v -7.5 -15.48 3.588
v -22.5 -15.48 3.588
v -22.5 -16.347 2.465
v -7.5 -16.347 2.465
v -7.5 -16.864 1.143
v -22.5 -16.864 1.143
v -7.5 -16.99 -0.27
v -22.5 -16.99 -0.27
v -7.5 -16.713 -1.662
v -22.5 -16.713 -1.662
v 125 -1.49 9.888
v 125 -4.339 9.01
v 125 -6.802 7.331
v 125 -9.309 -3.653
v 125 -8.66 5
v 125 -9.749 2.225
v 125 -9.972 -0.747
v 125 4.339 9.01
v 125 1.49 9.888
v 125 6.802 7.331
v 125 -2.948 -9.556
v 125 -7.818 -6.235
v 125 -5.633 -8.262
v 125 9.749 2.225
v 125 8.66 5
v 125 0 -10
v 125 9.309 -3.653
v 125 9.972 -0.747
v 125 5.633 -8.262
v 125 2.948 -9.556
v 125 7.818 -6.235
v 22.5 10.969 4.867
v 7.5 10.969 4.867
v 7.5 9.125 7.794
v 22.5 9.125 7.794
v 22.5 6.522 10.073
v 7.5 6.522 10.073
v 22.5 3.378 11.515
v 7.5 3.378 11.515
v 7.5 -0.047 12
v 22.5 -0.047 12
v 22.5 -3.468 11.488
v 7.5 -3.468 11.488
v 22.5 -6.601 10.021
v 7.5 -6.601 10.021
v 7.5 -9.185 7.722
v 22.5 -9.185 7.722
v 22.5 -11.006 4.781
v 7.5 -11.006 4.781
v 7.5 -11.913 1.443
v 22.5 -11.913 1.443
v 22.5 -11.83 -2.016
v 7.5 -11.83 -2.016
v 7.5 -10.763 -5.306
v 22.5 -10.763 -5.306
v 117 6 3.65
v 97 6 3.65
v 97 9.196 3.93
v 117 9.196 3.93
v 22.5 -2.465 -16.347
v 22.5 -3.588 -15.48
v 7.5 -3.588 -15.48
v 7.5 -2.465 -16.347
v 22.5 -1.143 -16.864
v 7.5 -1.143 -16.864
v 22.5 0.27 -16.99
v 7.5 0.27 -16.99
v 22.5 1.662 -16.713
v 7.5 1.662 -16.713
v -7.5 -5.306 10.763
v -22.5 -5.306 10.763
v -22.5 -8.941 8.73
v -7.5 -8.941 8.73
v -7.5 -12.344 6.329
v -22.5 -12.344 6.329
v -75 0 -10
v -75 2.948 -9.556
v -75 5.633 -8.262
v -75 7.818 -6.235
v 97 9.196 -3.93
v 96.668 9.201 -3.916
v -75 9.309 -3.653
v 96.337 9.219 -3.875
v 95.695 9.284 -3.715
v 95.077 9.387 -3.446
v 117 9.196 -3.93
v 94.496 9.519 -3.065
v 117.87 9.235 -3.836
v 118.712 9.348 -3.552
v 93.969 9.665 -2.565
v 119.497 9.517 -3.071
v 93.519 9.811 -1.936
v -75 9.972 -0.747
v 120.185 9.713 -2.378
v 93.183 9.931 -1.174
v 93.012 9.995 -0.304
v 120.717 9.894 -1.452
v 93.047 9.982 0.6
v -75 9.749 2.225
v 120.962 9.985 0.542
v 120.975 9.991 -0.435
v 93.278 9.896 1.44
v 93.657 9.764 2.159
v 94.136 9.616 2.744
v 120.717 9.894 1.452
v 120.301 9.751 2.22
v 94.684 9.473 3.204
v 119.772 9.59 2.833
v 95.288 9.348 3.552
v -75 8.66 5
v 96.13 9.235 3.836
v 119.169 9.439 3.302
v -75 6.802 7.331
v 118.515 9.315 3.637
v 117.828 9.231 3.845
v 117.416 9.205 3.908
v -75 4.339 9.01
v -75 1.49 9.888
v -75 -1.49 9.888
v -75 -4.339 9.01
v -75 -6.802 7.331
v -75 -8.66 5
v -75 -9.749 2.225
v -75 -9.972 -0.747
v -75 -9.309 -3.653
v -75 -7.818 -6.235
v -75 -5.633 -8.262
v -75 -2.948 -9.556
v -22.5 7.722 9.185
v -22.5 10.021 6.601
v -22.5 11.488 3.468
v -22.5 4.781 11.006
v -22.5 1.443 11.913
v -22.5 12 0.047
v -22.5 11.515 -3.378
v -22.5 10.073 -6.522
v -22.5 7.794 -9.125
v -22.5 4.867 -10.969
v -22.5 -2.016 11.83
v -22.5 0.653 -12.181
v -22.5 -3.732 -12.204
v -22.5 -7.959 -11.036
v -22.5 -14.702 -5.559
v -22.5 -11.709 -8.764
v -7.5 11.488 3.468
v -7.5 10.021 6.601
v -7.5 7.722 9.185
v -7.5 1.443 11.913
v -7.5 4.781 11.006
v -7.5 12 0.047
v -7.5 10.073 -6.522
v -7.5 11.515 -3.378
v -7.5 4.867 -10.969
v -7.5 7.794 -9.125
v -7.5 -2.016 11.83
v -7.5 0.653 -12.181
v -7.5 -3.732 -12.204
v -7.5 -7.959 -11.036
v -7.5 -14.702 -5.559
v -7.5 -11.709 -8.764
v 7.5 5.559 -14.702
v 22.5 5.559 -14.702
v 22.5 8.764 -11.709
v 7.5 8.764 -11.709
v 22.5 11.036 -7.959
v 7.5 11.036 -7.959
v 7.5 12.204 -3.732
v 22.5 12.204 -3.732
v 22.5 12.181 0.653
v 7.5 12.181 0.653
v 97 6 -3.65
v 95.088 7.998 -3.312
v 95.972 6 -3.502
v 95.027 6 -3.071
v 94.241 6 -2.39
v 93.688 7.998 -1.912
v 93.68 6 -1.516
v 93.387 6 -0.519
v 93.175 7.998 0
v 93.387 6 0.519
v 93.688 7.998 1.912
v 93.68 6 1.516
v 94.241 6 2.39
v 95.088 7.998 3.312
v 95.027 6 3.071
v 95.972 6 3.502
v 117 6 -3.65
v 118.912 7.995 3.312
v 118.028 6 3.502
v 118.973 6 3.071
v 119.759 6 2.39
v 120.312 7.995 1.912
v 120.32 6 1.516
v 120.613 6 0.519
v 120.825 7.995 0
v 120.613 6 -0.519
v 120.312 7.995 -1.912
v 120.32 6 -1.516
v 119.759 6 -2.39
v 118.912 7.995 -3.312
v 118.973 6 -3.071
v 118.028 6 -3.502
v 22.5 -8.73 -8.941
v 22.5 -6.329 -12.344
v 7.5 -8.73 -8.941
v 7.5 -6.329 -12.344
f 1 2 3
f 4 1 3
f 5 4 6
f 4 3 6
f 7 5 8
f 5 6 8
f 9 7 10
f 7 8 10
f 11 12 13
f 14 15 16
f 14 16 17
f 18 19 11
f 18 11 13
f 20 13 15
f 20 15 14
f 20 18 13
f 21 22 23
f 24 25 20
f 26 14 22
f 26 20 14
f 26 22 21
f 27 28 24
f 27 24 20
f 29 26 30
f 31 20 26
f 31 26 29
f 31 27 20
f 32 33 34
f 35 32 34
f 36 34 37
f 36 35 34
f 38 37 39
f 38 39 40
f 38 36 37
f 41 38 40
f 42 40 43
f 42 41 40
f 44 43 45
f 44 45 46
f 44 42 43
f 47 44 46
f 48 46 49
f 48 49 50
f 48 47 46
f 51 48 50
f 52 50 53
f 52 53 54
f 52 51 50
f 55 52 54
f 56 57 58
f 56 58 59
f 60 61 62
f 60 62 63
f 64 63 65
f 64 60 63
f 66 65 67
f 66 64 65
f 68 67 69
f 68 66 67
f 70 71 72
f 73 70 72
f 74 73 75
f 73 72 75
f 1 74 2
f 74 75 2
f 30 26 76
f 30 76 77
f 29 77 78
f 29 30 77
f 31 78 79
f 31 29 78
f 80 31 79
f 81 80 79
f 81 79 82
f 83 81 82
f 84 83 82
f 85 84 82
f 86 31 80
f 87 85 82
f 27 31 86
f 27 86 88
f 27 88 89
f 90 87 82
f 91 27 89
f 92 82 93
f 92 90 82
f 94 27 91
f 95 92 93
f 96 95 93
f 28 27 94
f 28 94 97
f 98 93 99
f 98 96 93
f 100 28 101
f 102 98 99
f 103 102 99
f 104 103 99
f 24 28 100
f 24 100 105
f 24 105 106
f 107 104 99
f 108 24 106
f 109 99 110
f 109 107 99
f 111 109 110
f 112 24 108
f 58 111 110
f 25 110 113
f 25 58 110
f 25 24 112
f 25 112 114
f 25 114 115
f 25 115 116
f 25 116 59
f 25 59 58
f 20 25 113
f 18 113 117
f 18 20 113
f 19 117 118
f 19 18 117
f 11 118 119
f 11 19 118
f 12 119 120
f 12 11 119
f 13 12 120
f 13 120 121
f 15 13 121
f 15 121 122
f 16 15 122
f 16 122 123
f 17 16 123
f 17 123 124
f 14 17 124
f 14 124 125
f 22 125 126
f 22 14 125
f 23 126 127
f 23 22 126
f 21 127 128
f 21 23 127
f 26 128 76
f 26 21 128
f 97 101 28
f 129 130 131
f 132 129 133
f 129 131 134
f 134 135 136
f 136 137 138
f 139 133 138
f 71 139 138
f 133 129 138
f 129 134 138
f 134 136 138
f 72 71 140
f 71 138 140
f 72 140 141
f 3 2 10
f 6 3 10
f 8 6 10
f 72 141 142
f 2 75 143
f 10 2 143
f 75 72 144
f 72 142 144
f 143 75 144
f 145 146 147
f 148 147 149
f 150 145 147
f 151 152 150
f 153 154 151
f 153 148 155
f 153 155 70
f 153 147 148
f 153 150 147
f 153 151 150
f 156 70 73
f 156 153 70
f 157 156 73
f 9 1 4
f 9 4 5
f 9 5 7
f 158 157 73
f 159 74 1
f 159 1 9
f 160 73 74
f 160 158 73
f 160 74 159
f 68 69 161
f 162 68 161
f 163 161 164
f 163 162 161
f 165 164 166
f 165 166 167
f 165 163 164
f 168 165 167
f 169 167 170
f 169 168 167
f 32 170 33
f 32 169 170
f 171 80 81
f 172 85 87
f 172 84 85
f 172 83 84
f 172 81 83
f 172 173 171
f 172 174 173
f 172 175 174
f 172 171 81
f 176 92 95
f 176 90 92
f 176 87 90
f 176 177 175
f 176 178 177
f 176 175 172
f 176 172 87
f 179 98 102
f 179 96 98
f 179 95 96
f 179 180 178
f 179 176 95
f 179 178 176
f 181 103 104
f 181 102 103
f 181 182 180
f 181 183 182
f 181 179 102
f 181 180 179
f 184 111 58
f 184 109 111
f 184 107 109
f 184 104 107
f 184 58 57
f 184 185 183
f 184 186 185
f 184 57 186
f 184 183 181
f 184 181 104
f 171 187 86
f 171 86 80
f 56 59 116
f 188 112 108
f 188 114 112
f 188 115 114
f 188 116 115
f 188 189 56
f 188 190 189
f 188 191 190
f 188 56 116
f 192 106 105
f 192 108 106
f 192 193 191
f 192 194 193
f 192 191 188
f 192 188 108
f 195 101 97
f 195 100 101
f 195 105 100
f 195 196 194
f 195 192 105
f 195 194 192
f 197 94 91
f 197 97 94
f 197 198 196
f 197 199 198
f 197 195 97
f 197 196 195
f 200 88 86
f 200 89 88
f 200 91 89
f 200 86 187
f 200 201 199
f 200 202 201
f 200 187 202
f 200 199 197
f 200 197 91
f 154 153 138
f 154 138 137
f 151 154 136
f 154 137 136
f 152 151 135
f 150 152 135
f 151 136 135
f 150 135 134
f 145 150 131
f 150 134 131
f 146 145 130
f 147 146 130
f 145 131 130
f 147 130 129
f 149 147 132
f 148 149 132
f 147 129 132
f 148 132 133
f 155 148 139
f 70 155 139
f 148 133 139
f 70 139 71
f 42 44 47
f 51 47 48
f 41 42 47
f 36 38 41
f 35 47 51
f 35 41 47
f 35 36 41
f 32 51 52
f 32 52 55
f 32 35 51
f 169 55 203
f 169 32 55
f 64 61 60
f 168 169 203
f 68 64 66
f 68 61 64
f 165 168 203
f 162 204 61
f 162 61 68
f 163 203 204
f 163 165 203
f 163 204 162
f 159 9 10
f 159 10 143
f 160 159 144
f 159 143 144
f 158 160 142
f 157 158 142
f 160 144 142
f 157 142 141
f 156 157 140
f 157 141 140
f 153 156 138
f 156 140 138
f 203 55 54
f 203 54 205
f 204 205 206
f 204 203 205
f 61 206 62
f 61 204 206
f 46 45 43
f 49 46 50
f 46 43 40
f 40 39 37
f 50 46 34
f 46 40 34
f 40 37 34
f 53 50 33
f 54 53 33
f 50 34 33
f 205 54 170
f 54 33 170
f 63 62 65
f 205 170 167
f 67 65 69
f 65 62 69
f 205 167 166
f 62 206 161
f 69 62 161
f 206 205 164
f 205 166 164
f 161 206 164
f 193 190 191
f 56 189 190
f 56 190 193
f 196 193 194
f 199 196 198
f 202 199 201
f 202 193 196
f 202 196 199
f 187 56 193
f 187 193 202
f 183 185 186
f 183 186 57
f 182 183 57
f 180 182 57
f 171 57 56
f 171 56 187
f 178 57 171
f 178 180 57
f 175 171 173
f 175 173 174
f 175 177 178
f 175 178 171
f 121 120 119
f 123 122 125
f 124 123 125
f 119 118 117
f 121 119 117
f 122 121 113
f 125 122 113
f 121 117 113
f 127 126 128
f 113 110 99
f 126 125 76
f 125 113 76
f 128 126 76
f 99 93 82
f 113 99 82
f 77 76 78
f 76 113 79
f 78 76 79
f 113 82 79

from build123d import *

# Parameters (mm, degrees)
SKETCH1_R                = 10
BOSS_EXTRUDE1_DEPTH      = 125
BOSS_EXTRUDE1_DEPTH_BACK = 75
BOSS_EXTRUDE2_START      = 15
BOSS_EXTRUDE2_DEPTH      = 7.5
BODY_MOVE_COPY1_ANGLE    = 90
CUT_EXTRUDE1_START       = 10
CUT_EXTRUDE1_DEPTH       = 4
CUT_EXTRUDE1_TAPER       = 5


with BuildPart() as part:
    # Sketch1 → Boss-Extrude1 (new body, two sides)
    with BuildSketch(Plane(origin=(0, 0, 0), x_dir=(0, 0, -1), z_dir=(1, 0, 0))) as boss_extrude1_sk:
        Circle(SKETCH1_R)
    extrude(amount=BOSS_EXTRUDE1_DEPTH)
    extrude(boss_extrude1_sk.sketch, amount=-BOSS_EXTRUDE1_DEPTH_BACK)

    # Sketch3 → Cut-Extrude1 (cut)
    with BuildSketch(Plane(origin=(0, 0, 0), x_dir=(1, 0, 0), z_dir=(0, 1, 0)).offset(CUT_EXTRUDE1_START)):
        with BuildLine():
            ThreePointArc((97, 4), (93, 0), (97, -4))
            Line((97, -4), (117, -4))
            ThreePointArc((117, -4), (121, 0), (117, 4))
            Line((117, 4), (97, 4))
        make_face()
    extrude(amount=-CUT_EXTRUDE1_DEPTH, taper=CUT_EXTRUDE1_TAPER, mode=Mode.SUBTRACT)


with BuildPart() as body_2:
    # Sketch2 → Boss-Extrude2 (new body, symmetric)
    with BuildSketch(Plane(origin=(0, 0, 0), x_dir=(0, 0, -1), z_dir=(1, 0, 0)).offset(BOSS_EXTRUDE2_START)):
        with BuildLine():
            ThreePointArc((-4.867089568, 10.968657125), (-10.868088345, -5.087696504), (5.306226617, -10.763083159))
            ThreePointArc((5.306226617, -10.763083159), (10.673744978, -7.573594418), (15.479542802, -3.587694386))
            ThreePointArc((15.479542802, -3.587694386), (16.864464688, -1.143374761), (16.712672037, 1.661917746))
            ThreePointArc((16.712672037, 1.661917746), (7.958571112, 11.035699457), (-4.867089568, 10.968657125))
        make_face()
    extrude(amount=BOSS_EXTRUDE2_DEPTH, both=True)


with BuildPart() as body_3:
    # Mirror1: mirrored copy
    add(body_2.part.mirror(Plane(origin=(0, 0, 0), x_dir=(0, 0, 1), z_dir=(1, 0, 0))))


with BuildPart() as body_3_1:
    # Body-Move/Copy1: moved
    add(body_3.part.rotate(Axis((0, 0, 0), (-1, 0, 0)), BODY_MOVE_COPY1_ANGLE))


solid = Compound([part.part, body_2.part, body_3_1.part])
